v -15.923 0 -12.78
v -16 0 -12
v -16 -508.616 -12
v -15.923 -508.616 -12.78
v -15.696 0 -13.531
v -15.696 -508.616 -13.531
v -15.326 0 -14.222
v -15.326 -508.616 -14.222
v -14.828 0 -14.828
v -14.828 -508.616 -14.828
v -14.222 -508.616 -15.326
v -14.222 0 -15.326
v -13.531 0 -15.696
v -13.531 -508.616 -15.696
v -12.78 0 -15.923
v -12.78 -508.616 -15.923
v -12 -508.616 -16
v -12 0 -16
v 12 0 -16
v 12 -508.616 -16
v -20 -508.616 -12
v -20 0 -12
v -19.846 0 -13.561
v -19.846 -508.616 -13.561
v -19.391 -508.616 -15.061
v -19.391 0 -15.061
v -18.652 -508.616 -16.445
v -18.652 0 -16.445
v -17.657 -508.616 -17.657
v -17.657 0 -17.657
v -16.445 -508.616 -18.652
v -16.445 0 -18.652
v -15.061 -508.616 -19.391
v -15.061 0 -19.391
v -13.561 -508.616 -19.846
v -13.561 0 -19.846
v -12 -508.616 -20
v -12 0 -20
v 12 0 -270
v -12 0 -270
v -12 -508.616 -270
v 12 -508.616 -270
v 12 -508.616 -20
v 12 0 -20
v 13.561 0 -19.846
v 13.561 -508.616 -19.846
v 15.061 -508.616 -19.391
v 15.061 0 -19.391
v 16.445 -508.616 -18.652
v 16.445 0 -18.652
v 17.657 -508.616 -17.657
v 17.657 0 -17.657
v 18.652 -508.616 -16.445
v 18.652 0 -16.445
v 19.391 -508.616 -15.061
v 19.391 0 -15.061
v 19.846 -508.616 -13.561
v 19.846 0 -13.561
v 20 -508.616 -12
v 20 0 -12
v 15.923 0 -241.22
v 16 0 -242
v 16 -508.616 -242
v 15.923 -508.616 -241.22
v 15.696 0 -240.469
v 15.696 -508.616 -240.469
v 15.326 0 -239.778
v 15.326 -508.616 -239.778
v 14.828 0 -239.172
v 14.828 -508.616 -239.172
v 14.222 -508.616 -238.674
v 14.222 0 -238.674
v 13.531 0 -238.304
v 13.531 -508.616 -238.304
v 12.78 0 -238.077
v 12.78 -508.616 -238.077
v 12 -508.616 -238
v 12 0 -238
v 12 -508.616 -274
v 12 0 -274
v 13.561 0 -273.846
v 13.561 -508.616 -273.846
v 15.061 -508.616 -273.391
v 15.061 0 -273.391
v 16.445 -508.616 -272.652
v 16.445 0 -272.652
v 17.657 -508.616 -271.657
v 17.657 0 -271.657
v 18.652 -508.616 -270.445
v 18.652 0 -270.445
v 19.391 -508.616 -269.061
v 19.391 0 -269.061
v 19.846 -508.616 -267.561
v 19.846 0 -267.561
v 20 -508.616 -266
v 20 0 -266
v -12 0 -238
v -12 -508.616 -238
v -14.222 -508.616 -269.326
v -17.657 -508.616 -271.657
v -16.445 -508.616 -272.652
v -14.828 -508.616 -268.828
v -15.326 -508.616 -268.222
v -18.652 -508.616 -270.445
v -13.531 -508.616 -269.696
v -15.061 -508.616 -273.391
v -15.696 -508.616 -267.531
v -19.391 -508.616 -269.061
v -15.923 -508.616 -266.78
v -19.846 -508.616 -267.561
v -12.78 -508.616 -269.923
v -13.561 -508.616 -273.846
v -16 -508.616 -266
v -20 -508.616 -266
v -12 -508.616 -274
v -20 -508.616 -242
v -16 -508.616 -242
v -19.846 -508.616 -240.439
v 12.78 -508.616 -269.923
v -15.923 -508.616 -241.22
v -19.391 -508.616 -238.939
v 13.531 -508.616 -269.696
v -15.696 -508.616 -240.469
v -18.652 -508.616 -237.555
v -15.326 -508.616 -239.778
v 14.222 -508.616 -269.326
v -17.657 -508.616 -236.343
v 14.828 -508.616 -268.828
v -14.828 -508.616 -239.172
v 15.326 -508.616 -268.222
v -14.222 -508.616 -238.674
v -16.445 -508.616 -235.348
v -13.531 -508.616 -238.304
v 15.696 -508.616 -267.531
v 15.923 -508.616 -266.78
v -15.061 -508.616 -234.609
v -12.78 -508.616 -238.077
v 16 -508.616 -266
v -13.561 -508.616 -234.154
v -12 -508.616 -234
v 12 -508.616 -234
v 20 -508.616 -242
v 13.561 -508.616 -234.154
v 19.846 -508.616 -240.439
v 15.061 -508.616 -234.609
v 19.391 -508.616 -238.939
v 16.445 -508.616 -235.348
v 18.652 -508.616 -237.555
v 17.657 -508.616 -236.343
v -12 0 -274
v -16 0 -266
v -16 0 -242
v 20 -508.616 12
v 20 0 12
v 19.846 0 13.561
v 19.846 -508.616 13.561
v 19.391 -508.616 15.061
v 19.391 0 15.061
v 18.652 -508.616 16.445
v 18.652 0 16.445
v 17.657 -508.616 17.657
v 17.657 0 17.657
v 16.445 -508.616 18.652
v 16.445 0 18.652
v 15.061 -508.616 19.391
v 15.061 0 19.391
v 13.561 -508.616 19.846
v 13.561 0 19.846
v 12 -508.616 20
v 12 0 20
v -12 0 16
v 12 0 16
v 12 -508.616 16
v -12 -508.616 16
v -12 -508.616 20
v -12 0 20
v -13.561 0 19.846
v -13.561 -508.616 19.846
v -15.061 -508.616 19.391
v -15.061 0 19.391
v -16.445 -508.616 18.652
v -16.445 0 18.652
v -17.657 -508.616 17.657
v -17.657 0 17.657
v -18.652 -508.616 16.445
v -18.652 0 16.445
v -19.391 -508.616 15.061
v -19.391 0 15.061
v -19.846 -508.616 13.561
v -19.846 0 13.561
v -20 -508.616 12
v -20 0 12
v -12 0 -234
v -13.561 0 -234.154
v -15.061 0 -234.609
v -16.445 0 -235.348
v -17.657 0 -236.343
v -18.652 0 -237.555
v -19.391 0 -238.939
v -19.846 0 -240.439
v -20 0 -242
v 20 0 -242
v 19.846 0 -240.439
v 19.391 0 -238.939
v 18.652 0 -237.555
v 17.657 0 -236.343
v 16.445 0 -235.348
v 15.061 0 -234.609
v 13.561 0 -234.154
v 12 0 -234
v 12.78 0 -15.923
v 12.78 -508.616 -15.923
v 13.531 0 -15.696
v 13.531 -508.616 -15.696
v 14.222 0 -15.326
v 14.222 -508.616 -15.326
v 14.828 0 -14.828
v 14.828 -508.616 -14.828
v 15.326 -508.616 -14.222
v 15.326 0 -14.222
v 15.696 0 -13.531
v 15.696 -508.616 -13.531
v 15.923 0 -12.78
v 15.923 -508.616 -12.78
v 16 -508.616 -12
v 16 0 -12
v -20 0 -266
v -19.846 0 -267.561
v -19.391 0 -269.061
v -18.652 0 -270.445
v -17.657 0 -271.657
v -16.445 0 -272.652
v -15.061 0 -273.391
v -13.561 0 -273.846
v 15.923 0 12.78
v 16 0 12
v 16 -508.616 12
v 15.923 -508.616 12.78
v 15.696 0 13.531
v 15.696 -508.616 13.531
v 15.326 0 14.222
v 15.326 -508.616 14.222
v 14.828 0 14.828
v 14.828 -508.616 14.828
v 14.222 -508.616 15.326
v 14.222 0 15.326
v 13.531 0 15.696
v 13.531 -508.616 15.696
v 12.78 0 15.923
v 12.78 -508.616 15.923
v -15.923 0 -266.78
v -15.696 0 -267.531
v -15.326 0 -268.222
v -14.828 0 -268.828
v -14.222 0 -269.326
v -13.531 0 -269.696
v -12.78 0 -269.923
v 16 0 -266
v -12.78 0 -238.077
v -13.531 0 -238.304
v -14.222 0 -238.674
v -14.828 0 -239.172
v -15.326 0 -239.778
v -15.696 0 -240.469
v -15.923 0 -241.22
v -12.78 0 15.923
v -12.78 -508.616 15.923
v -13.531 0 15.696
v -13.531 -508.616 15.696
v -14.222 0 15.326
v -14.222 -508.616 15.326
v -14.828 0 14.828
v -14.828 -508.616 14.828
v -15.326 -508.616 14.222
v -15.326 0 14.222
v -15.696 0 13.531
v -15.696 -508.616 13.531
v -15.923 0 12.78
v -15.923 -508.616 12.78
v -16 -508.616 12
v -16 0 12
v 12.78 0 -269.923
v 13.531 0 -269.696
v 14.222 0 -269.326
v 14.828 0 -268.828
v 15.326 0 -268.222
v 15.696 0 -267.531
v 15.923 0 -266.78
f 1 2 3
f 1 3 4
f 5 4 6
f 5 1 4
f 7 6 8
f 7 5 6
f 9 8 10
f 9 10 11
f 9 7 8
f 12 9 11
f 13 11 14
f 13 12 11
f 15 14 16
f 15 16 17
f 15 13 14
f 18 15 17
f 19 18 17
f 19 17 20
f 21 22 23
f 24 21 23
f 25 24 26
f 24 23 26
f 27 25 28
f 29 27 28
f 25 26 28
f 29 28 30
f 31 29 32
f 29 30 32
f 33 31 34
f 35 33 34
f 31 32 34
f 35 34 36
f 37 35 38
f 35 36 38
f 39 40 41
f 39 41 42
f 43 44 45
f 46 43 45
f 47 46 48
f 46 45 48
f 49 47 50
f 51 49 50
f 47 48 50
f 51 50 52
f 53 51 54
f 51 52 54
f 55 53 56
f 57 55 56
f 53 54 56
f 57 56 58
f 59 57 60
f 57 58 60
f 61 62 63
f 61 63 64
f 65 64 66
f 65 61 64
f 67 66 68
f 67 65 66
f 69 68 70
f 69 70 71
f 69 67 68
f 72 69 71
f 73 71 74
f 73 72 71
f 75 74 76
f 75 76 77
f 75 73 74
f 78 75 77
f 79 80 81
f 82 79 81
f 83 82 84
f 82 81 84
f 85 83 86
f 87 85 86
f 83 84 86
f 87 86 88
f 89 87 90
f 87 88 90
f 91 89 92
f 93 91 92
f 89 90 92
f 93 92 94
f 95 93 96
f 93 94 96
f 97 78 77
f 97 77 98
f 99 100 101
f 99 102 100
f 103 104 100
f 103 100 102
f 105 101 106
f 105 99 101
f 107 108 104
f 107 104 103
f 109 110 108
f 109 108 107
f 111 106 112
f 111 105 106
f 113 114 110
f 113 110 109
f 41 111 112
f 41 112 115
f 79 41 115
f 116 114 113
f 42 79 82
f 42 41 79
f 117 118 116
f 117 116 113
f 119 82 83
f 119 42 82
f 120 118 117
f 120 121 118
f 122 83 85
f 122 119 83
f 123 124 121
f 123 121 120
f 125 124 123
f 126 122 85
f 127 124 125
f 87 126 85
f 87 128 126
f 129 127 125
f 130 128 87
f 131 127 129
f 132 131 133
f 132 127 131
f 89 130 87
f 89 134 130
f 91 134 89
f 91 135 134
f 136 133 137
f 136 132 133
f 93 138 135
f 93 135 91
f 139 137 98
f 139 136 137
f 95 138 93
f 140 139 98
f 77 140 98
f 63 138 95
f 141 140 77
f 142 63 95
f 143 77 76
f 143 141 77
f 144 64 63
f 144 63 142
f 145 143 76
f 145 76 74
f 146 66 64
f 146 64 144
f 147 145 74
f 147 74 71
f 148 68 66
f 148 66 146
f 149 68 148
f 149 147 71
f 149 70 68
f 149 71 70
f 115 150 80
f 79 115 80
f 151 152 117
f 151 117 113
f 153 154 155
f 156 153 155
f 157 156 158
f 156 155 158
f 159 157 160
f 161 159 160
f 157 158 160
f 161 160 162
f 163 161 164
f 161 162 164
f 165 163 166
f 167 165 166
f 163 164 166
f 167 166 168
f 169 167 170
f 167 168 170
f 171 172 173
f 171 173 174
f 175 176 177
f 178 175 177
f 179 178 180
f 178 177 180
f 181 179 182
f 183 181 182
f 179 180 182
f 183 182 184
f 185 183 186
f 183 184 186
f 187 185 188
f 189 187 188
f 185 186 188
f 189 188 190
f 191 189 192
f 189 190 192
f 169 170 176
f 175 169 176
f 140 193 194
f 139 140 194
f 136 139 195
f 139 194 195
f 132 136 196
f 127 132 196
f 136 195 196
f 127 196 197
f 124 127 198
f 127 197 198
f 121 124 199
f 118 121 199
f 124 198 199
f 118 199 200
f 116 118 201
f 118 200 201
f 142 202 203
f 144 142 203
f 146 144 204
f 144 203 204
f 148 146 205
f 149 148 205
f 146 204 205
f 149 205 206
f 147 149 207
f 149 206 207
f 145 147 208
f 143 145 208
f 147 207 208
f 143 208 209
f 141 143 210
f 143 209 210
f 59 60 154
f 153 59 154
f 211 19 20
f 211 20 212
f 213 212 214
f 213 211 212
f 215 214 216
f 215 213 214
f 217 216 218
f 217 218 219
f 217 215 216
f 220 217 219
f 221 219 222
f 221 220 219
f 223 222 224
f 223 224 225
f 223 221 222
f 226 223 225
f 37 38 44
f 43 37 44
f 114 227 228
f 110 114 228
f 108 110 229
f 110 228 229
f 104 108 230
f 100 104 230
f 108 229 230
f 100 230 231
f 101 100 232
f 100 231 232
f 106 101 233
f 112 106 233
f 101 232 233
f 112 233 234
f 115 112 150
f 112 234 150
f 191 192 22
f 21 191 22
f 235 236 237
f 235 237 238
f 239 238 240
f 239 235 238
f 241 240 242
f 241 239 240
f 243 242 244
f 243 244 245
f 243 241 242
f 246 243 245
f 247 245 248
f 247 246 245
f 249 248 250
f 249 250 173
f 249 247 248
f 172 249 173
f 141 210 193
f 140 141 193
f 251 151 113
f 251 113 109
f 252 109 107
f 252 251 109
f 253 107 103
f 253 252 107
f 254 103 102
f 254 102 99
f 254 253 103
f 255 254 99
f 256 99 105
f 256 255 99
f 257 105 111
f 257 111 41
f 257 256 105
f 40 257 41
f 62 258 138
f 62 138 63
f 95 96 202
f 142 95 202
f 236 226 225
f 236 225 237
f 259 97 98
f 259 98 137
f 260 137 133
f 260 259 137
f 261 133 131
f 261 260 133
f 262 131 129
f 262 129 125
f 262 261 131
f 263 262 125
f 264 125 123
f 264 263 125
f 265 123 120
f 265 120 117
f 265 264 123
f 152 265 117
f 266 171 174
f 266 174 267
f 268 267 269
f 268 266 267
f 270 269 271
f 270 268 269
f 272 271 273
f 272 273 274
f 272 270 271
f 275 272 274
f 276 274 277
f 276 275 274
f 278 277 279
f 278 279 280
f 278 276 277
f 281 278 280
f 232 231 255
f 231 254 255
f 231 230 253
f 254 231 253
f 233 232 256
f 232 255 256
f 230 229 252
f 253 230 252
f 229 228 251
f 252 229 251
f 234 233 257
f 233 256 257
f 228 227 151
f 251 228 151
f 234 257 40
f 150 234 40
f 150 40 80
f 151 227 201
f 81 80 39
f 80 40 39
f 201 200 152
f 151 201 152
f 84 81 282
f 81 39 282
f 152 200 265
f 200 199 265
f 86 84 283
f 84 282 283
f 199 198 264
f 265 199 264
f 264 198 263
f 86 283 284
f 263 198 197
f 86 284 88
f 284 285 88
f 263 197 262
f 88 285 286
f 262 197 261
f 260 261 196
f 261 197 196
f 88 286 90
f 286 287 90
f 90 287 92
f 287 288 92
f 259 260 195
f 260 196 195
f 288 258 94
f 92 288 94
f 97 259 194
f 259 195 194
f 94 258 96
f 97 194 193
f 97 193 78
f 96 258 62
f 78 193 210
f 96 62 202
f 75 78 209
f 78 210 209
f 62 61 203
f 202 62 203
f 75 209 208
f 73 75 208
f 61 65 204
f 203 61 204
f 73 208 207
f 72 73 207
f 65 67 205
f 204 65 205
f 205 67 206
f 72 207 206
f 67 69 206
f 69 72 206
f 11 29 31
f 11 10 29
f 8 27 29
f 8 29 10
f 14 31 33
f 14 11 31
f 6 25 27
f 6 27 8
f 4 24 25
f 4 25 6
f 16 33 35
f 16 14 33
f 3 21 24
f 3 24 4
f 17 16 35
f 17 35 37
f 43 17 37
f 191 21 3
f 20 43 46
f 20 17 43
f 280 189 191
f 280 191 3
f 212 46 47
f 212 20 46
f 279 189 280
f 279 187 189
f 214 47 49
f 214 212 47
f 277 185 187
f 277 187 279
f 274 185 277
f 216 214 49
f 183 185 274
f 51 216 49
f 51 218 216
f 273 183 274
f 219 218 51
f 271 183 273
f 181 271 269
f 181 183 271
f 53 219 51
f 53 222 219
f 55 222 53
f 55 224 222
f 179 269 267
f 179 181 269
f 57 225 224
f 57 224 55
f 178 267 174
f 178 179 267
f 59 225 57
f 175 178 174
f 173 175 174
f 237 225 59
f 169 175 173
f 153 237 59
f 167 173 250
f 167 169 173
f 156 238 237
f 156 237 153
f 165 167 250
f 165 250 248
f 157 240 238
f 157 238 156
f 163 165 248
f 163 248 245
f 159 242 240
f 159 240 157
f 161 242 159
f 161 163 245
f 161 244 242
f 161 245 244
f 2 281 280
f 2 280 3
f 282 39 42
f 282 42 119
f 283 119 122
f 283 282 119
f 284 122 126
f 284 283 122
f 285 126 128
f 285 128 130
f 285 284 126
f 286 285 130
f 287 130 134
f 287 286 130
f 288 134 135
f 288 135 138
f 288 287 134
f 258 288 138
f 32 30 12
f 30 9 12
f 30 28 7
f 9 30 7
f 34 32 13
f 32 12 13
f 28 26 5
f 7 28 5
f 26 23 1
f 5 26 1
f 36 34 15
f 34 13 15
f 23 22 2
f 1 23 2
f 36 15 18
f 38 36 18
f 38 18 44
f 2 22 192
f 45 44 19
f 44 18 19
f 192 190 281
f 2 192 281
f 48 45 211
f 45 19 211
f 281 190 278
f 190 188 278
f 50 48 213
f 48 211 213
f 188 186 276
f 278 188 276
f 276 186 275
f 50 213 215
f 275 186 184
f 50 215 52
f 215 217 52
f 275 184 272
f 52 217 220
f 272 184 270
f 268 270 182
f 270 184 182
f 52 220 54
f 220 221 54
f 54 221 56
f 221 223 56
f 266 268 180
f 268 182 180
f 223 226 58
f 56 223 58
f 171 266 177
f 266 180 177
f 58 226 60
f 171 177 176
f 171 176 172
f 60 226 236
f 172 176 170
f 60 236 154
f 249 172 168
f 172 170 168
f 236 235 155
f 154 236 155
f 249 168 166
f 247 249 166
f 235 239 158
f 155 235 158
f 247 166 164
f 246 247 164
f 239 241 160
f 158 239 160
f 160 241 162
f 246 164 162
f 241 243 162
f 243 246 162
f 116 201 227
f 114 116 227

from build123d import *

# Parameters (mm, degrees)
SQUARE_TUBE_40_X_40_X_4_2_DEPTH   = 508.616222313
SQUARE_TUBE_40_X_40_X_4_2_2_DEPTH = 508.616222313


with BuildPart() as part:
    # Sketch13 → Square tube 40 X 40 X 4(2) (new body)
    with BuildSketch(Plane(origin=(0, 0, -254), x_dir=(1, 0, 0), z_dir=(0, -1, 0))):
        with BuildLine():
            Line((-12, -20), (12, -20))
            ThreePointArc((12, -20), (17.656854249, -17.656854249), (20, -12))
            Line((20, -12), (20, 12))
            ThreePointArc((20, 12), (17.656854249, 17.656854249), (12, 20))
            Line((12, 20), (-12, 20))
            ThreePointArc((-12, 20), (-17.656854249, 17.656854249), (-20, 12))
            Line((-20, 12), (-20, -12))
            ThreePointArc((-20, -12), (-17.656854249, -17.656854249), (-12, -20))
        make_face()
        with BuildLine():
            Line((-12, -16), (12, -16))
            ThreePointArc((12, -16), (14.828427125, -14.828427125), (16, -12))
            Line((16, -12), (16, 12))
            ThreePointArc((16, 12), (14.828427125, 14.828427125), (12, 16))
            Line((12, 16), (-12, 16))
            ThreePointArc((-12, 16), (-14.828427125, 14.828427125), (-16, 12))
            Line((-16, 12), (-16, -12))
            ThreePointArc((-16, -12), (-14.828427125, -14.828427125), (-12, -16))
        make_face(mode=Mode.SUBTRACT)
    extrude(amount=SQUARE_TUBE_40_X_40_X_4_2_DEPTH)


with BuildPart() as body_2:
    # Sketch13 on segment 2 (carried to segment 2) → Square tube 40 X 40 X 4_2 2 (new body)
    with BuildSketch(Plane.XZ):
        with BuildLine():
            Line((-12, -20), (12, -20))
            ThreePointArc((12, -20), (17.656854249, -17.656854249), (20, -12))
            Line((20, -12), (20, 12))
            ThreePointArc((20, 12), (17.656854249, 17.656854249), (12, 20))
            Line((12, 20), (-12, 20))
            ThreePointArc((-12, 20), (-17.656854249, 17.656854249), (-20, 12))
            Line((-20, 12), (-20, -12))
            ThreePointArc((-20, -12), (-17.656854249, -17.656854249), (-12, -20))
        make_face()
        with BuildLine():
            Line((-12, -16), (12, -16))
            ThreePointArc((12, -16), (14.828427125, -14.828427125), (16, -12))
            Line((16, -12), (16, 12))
            ThreePointArc((16, 12), (14.828427125, 14.828427125), (12, 16))
            Line((12, 16), (-12, 16))
            ThreePointArc((-12, 16), (-14.828427125, 14.828427125), (-16, 12))
            Line((-16, 12), (-16, -12))
            ThreePointArc((-16, -12), (-14.828427125, -14.828427125), (-12, -16))
        make_face(mode=Mode.SUBTRACT)
    extrude(amount=SQUARE_TUBE_40_X_40_X_4_2_2_DEPTH)


solid = Compound([part.part, body_2.part])
